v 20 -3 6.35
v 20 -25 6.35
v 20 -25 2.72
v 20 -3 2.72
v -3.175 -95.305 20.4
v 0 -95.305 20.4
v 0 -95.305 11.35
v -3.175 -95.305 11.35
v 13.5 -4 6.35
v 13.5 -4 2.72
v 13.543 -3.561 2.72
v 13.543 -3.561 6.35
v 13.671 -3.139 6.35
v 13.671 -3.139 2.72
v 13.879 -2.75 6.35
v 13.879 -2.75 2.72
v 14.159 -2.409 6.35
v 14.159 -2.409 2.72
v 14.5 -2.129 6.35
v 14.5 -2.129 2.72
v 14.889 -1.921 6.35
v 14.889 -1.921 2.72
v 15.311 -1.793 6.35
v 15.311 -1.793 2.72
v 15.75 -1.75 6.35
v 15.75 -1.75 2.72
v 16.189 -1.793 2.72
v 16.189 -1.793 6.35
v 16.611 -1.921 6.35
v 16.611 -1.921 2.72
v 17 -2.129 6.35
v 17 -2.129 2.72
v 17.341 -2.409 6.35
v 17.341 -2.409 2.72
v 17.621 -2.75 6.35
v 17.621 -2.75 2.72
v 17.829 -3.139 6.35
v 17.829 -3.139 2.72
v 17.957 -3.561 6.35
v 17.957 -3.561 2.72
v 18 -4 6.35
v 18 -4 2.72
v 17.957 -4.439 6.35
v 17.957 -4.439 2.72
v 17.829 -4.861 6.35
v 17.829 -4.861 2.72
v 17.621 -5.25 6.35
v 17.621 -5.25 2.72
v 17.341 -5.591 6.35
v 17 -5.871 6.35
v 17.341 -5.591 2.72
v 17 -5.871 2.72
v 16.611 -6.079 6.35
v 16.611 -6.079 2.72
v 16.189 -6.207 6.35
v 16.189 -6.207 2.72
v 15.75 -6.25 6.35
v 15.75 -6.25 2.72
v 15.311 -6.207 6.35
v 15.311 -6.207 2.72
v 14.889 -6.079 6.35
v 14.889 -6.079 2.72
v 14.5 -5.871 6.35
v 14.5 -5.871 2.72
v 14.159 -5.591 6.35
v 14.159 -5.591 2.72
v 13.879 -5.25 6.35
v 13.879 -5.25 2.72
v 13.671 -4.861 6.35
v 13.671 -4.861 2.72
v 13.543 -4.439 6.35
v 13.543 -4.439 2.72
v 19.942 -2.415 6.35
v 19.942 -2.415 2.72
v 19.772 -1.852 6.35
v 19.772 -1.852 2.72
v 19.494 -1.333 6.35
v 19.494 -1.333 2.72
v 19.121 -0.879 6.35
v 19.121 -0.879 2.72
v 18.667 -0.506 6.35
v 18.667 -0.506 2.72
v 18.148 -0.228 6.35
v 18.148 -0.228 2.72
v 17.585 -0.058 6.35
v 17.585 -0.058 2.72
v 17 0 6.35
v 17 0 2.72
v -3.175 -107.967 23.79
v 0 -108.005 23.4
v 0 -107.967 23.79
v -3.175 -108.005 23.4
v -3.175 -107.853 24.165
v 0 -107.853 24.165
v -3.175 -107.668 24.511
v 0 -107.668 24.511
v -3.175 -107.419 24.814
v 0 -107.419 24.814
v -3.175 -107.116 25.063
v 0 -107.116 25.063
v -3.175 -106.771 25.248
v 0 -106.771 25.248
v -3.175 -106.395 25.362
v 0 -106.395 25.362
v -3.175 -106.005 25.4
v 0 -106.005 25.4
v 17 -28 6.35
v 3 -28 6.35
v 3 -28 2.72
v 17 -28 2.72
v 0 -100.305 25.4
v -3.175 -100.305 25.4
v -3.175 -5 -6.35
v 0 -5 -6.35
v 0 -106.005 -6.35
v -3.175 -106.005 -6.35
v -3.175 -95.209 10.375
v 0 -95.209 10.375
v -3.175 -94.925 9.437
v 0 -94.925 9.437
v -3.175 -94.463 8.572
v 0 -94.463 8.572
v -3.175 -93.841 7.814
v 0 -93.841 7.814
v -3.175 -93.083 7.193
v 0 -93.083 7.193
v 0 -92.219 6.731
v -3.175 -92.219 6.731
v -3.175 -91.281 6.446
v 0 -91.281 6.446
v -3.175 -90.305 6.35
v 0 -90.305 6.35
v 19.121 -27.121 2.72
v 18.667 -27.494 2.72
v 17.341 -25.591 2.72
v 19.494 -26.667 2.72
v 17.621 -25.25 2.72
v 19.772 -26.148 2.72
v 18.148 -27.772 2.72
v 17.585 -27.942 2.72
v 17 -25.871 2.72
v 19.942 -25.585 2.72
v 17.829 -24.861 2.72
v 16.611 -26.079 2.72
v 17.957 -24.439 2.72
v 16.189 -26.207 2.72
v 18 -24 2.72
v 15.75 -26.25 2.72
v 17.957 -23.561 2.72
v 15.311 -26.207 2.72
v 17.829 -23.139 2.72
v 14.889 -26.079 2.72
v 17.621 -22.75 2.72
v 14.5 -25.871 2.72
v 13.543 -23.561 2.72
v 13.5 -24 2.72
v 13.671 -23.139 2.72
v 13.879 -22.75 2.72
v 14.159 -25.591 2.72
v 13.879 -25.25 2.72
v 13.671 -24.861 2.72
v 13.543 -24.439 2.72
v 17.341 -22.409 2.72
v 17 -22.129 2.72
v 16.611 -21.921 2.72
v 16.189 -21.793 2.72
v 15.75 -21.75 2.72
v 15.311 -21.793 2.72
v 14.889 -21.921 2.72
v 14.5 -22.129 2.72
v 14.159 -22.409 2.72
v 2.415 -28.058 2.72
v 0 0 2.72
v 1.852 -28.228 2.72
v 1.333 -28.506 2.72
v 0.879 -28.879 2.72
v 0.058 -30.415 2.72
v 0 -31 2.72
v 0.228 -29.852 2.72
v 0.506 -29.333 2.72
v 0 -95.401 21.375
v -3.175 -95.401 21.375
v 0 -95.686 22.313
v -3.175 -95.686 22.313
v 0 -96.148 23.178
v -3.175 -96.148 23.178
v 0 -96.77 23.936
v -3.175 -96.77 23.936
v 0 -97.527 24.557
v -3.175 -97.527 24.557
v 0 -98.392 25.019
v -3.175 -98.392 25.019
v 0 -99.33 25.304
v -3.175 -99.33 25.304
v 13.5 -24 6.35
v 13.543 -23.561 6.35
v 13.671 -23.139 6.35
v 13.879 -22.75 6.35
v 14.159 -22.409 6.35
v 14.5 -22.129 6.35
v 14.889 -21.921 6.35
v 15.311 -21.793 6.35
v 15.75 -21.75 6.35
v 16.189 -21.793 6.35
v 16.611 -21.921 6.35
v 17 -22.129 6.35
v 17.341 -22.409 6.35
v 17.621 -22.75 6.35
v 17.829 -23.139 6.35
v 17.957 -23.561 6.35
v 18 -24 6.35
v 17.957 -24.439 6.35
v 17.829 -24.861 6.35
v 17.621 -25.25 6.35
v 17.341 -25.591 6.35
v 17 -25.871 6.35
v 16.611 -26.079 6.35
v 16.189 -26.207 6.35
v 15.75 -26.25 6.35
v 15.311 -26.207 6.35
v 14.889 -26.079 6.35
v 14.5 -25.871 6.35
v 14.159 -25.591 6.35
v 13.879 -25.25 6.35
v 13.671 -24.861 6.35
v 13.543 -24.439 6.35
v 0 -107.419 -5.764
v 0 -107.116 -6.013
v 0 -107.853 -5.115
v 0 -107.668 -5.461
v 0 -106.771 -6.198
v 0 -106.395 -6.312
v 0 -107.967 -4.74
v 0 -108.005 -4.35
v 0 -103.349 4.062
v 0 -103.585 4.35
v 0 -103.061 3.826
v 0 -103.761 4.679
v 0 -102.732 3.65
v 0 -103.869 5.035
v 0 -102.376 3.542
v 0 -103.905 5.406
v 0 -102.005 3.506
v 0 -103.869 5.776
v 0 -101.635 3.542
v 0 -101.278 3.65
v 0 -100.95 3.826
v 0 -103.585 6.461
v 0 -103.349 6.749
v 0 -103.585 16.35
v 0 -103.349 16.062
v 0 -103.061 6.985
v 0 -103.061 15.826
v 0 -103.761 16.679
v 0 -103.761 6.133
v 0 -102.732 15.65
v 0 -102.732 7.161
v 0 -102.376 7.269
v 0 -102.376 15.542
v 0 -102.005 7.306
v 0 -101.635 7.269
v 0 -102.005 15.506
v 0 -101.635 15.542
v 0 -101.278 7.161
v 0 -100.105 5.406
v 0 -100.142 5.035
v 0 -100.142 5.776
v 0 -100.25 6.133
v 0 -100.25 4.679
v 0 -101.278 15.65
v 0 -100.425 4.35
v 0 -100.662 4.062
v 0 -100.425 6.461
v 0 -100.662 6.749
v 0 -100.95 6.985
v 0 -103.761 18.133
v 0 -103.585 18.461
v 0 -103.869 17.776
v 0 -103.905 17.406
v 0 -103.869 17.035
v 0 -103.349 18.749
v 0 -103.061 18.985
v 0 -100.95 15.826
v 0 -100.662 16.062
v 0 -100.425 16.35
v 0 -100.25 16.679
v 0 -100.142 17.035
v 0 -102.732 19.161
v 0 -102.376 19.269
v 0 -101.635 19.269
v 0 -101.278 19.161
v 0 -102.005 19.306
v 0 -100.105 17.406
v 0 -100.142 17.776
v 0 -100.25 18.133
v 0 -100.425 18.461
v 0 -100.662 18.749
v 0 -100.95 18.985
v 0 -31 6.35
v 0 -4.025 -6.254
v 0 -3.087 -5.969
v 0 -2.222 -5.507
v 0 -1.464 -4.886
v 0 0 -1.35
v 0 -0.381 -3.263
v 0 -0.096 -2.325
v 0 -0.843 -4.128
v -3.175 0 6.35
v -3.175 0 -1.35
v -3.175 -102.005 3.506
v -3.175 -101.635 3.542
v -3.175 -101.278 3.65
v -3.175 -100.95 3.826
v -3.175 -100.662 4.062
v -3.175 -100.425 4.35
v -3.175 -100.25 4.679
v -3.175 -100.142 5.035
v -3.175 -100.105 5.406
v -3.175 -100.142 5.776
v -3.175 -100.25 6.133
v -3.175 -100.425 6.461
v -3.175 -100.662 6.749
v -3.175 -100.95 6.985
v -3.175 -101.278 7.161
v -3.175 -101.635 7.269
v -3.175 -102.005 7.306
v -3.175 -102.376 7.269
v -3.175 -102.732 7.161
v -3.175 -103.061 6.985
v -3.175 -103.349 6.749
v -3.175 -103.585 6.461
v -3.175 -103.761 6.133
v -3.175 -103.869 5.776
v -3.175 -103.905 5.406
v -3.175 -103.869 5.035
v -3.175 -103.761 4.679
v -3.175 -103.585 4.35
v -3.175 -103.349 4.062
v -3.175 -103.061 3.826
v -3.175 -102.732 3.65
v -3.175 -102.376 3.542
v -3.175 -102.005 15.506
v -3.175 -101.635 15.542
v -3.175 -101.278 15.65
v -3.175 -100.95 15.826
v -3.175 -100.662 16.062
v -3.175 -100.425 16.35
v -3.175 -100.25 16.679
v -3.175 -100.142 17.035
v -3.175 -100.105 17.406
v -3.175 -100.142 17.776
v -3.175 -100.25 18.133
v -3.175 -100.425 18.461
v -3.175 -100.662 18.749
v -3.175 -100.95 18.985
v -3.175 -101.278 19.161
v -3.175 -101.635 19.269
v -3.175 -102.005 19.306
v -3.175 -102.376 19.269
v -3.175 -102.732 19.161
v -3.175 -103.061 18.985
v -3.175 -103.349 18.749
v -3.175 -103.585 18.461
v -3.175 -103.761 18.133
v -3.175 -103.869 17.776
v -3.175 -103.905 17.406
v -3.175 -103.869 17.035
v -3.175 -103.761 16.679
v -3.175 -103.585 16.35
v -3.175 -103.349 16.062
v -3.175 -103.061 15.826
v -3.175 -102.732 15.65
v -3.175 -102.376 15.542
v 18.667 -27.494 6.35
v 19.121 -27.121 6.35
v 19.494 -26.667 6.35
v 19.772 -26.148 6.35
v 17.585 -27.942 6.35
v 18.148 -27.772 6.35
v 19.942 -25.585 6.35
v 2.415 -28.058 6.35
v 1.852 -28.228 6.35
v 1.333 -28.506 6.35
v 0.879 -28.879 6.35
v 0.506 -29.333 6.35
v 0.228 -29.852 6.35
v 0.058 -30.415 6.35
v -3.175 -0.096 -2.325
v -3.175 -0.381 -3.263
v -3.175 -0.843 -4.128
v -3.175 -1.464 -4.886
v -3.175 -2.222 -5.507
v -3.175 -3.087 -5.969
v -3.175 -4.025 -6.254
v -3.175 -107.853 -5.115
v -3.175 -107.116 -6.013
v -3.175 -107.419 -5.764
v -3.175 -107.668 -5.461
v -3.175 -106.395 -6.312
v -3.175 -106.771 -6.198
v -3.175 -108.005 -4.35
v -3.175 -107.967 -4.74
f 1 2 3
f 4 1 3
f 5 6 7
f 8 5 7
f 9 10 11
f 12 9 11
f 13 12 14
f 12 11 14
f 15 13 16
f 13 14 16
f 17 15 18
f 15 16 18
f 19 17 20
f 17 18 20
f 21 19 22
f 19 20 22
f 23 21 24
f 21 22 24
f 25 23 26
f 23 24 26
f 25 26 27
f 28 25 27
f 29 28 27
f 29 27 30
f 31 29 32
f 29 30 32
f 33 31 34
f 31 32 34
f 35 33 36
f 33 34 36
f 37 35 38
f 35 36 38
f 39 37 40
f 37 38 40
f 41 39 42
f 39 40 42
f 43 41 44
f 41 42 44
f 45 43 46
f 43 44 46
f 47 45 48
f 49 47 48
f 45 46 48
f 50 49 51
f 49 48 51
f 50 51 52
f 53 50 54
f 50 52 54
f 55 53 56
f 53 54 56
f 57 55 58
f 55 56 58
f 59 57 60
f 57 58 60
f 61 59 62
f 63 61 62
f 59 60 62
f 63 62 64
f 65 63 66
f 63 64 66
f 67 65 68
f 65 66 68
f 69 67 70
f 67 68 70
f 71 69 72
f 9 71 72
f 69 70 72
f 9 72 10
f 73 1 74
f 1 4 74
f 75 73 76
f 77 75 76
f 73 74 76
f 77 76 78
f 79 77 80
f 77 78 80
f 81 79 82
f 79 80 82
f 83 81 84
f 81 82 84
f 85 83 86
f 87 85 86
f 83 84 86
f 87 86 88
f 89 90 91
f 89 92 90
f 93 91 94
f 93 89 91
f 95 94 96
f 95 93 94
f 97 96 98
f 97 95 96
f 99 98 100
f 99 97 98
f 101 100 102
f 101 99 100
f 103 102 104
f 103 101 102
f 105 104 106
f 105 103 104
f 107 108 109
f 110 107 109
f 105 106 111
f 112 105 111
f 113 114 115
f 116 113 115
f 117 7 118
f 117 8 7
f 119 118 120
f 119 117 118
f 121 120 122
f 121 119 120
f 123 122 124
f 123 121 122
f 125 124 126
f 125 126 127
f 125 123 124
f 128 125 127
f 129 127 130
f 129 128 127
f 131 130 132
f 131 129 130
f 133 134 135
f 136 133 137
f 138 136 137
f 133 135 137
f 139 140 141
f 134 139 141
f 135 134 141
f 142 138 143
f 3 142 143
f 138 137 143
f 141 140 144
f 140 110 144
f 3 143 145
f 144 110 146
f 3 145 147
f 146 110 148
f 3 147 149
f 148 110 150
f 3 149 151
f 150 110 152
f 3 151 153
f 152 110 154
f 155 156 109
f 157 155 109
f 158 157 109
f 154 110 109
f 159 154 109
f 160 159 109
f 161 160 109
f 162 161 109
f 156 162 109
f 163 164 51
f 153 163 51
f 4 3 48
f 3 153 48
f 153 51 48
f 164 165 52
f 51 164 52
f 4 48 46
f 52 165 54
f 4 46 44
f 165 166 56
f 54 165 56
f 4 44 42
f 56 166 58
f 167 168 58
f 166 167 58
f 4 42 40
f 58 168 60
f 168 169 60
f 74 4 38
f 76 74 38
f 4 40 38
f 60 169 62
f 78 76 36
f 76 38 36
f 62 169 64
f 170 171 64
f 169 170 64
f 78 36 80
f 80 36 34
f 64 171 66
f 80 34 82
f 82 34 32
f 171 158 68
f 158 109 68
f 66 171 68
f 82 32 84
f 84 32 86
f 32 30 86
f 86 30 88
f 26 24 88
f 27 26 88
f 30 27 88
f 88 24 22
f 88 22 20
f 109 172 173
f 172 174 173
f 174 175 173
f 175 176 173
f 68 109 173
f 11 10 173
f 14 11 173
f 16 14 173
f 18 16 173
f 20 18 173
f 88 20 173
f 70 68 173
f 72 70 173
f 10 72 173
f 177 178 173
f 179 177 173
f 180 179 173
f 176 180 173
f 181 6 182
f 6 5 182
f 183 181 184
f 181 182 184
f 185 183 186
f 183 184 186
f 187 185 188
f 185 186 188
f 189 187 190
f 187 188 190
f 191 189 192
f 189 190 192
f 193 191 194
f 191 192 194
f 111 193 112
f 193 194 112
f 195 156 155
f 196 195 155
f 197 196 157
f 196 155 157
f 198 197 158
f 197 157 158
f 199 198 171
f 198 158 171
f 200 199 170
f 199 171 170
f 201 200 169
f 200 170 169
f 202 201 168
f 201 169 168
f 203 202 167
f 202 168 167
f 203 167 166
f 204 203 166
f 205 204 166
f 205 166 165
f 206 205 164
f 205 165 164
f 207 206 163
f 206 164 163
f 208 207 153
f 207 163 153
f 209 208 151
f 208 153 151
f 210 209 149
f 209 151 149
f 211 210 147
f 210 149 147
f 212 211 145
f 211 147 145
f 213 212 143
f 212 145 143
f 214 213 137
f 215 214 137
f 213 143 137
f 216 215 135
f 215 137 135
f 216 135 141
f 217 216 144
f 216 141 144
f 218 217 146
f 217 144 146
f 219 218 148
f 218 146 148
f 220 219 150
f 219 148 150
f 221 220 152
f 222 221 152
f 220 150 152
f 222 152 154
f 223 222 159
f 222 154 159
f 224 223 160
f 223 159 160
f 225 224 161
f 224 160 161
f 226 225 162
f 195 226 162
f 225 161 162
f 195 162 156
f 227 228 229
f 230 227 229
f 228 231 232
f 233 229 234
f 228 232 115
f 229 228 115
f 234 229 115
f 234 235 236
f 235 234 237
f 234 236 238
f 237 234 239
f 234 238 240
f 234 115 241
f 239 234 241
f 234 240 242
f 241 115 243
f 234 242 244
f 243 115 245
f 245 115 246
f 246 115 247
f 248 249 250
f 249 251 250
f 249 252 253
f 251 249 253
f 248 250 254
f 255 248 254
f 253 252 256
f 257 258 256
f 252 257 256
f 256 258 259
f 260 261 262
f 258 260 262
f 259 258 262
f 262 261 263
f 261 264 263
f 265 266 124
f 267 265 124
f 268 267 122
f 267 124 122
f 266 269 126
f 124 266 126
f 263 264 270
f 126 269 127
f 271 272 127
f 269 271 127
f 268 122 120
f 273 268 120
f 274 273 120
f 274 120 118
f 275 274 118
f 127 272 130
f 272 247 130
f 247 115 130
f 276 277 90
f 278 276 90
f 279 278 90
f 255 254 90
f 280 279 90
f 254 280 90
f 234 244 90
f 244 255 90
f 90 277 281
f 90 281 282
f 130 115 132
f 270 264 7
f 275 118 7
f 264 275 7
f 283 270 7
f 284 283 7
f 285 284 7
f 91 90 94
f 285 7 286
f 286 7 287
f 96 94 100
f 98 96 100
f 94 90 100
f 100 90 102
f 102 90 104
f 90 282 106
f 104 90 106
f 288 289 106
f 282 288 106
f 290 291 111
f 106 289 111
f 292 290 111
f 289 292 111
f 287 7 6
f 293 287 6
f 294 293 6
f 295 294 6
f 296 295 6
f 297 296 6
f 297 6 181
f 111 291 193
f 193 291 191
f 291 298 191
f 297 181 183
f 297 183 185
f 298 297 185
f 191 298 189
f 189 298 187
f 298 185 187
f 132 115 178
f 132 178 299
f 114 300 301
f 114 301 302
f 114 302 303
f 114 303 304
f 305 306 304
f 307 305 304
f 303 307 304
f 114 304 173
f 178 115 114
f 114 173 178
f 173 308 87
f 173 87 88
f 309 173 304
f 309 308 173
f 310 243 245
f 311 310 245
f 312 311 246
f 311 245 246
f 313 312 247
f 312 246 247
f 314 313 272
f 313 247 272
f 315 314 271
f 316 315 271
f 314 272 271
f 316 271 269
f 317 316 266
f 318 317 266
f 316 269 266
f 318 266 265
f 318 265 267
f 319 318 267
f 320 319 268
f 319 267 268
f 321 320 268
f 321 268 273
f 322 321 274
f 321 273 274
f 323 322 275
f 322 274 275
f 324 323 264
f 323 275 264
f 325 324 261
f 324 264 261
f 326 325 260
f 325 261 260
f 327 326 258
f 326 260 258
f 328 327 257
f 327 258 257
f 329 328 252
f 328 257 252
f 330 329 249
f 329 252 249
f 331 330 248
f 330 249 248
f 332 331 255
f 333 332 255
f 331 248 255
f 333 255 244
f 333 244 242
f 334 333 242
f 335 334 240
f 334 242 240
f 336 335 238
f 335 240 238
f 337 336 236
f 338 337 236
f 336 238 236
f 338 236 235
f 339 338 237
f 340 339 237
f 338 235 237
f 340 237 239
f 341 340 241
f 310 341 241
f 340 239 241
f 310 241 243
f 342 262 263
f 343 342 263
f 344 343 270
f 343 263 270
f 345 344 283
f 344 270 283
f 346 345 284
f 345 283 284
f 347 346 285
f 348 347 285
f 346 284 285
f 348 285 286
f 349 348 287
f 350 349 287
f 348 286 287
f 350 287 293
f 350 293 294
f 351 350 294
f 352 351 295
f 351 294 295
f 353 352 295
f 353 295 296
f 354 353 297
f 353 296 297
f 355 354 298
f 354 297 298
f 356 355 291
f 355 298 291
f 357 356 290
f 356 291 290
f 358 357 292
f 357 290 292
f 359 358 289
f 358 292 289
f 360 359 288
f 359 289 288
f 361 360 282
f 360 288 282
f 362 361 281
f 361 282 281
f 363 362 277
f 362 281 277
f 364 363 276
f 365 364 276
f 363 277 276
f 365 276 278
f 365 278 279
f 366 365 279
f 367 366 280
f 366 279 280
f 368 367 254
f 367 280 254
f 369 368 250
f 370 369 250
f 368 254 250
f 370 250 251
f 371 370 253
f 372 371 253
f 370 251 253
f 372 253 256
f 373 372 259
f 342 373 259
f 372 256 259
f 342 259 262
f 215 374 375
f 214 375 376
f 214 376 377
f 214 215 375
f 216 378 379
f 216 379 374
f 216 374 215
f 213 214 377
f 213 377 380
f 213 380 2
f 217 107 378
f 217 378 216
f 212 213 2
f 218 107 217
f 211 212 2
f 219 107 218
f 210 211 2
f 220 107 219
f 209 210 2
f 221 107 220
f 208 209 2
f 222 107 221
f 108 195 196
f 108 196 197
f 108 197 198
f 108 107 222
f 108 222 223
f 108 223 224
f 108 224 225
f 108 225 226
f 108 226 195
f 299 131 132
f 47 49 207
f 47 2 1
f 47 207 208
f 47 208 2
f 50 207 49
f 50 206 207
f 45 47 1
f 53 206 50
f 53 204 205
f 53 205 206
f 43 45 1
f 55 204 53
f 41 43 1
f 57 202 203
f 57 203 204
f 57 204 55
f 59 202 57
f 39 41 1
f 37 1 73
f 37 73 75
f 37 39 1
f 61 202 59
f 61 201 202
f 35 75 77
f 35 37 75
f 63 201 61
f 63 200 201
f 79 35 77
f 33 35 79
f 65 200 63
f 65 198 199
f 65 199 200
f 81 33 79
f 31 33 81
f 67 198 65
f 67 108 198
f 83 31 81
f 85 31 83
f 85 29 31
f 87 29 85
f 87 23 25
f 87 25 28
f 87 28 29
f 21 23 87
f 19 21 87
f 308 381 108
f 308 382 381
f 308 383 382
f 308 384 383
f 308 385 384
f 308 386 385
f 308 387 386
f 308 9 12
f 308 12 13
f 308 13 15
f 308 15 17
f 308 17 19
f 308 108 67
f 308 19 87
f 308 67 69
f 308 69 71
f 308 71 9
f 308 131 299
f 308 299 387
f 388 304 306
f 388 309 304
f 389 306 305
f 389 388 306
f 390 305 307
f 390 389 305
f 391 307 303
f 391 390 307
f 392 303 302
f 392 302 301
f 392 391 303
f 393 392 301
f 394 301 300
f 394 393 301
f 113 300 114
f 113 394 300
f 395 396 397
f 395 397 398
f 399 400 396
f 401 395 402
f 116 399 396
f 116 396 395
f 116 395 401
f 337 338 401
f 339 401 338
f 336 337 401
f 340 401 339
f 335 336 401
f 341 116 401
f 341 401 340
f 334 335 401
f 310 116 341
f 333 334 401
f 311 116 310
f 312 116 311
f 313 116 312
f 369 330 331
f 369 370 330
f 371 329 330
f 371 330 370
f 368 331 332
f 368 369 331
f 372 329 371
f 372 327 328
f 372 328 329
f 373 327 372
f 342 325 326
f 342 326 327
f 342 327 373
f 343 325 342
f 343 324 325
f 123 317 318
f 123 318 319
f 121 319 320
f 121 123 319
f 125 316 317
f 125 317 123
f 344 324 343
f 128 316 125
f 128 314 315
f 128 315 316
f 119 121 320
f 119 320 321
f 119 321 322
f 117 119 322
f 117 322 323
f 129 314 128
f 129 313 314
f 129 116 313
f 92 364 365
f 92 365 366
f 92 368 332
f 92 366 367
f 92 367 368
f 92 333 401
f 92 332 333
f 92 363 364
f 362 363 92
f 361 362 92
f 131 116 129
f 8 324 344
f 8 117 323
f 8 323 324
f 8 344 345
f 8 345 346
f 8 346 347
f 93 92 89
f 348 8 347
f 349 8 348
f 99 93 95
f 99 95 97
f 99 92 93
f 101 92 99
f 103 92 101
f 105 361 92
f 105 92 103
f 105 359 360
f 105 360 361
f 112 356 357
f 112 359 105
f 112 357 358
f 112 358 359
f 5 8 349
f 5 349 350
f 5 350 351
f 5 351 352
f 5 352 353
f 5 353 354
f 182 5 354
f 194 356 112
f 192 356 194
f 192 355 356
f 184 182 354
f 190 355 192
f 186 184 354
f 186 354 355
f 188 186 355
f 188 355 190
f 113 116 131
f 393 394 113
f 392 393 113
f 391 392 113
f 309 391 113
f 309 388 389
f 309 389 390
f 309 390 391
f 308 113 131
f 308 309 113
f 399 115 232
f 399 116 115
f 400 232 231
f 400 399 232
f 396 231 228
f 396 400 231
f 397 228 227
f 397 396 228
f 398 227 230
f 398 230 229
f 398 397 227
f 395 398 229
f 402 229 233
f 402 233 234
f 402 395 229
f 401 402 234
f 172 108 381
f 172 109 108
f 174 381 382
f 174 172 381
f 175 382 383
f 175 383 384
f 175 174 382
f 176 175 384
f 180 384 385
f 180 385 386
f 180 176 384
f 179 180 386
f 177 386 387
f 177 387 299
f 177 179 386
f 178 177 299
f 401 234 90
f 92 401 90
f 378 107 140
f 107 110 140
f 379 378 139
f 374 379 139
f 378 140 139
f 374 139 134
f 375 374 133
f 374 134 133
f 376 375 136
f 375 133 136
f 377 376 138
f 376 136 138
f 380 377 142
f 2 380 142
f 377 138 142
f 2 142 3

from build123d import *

# Parameters (mm, degrees)
BOSS_EXTRUDE1_DEPTH = 3.175
FILLET1_R           = 5
SKETCH3_W           = 3.629817958
SKETCH3_H           = 28
BOSS_EXTRUDE2_DEPTH = 20
SKETCH4_R           = 2.25
CUT_EXTRUDE1_DEPTH  = 3.629817958
FILLET2_R           = 3
FILLET3_R           = 2
SKETCH6_R           = 1.9
CUT_EXTRUDE2_DEPTH  = 3.175


with BuildPart() as part:
    # Sketch2 → Boss-Extrude1 (new body)
    with BuildSketch(Plane(origin=(0, 0, 0), x_dir=(0, 0, -1), z_dir=(1, 0, 0))):
        Polygon((-25.4, -95.305238918), (-6.35, -95.305238918), (-6.35, 0), (6.35, 0), (6.35, -108.005238918), (-25.4, -108.005238918), align=None)
    extrude(amount=-BOSS_EXTRUDE1_DEPTH)

    # Fillet1
    fillet1_edges = [part.edges().sort_by_distance(p)[0] for p in [
        (-1.5875, -95.305238918, 25.4),
        (-1.5875, -95.305238918, 6.35),
        (-1.5875, 0, -6.35),
    ]]
    fillet(fillet1_edges, radius=FILLET1_R)

    # Sketch3 → Boss-Extrude2 (add)
    with BuildSketch(Plane(origin=(0, 0, 0), x_dir=(0, 0, -1), z_dir=(1, 0, 0))):
        with Locations((-4.535091021, -14)):
            Rectangle(SKETCH3_W, SKETCH3_H)
    extrude(amount=BOSS_EXTRUDE2_DEPTH)

    # Sketch4 → Cut-Extrude1 (cut)
    with BuildSketch(Plane(origin=(0, 0, 2.720182042), x_dir=(-1, 0, 0), z_dir=(0, 0, -1))):
        with Locations((-15.75, -24)):
            Circle(SKETCH4_R)
        with Locations((-15.75, -4)):
            Circle(SKETCH4_R)
    extrude(amount=-CUT_EXTRUDE1_DEPTH, mode=Mode.SUBTRACT)

    # Fillet2
    fillet2_edges = [part.edges().sort_by_distance(p)[0] for p in [
        (0, -28, 4.535091021),
        (20, 0, 4.535091021),
        (20, -28, 4.535091021),
    ]]
    fillet(fillet2_edges, radius=FILLET2_R)

    # Fillet3
    fillet3_edges = [part.edges().sort_by_distance(p)[0] for p in [
        (-1.5875, -108.005238918, -6.35),
        (-1.5875, -108.005238918, 25.4),
    ]]
    fillet(fillet3_edges, radius=FILLET3_R)

    # Sketch6 → Cut-Extrude2 (cut)
    with BuildSketch(Plane(origin=(0, 0, 0), x_dir=(0, 0, -1), z_dir=(1, 0, 0))):
        with Locations((-5.405608289, -102.005238918)):
            Circle(SKETCH6_R)
        with Locations((-17.405608289, -102.005238918)):
            Circle(SKETCH6_R)
    extrude(amount=-CUT_EXTRUDE2_DEPTH, mode=Mode.SUBTRACT)


solid = part.part
